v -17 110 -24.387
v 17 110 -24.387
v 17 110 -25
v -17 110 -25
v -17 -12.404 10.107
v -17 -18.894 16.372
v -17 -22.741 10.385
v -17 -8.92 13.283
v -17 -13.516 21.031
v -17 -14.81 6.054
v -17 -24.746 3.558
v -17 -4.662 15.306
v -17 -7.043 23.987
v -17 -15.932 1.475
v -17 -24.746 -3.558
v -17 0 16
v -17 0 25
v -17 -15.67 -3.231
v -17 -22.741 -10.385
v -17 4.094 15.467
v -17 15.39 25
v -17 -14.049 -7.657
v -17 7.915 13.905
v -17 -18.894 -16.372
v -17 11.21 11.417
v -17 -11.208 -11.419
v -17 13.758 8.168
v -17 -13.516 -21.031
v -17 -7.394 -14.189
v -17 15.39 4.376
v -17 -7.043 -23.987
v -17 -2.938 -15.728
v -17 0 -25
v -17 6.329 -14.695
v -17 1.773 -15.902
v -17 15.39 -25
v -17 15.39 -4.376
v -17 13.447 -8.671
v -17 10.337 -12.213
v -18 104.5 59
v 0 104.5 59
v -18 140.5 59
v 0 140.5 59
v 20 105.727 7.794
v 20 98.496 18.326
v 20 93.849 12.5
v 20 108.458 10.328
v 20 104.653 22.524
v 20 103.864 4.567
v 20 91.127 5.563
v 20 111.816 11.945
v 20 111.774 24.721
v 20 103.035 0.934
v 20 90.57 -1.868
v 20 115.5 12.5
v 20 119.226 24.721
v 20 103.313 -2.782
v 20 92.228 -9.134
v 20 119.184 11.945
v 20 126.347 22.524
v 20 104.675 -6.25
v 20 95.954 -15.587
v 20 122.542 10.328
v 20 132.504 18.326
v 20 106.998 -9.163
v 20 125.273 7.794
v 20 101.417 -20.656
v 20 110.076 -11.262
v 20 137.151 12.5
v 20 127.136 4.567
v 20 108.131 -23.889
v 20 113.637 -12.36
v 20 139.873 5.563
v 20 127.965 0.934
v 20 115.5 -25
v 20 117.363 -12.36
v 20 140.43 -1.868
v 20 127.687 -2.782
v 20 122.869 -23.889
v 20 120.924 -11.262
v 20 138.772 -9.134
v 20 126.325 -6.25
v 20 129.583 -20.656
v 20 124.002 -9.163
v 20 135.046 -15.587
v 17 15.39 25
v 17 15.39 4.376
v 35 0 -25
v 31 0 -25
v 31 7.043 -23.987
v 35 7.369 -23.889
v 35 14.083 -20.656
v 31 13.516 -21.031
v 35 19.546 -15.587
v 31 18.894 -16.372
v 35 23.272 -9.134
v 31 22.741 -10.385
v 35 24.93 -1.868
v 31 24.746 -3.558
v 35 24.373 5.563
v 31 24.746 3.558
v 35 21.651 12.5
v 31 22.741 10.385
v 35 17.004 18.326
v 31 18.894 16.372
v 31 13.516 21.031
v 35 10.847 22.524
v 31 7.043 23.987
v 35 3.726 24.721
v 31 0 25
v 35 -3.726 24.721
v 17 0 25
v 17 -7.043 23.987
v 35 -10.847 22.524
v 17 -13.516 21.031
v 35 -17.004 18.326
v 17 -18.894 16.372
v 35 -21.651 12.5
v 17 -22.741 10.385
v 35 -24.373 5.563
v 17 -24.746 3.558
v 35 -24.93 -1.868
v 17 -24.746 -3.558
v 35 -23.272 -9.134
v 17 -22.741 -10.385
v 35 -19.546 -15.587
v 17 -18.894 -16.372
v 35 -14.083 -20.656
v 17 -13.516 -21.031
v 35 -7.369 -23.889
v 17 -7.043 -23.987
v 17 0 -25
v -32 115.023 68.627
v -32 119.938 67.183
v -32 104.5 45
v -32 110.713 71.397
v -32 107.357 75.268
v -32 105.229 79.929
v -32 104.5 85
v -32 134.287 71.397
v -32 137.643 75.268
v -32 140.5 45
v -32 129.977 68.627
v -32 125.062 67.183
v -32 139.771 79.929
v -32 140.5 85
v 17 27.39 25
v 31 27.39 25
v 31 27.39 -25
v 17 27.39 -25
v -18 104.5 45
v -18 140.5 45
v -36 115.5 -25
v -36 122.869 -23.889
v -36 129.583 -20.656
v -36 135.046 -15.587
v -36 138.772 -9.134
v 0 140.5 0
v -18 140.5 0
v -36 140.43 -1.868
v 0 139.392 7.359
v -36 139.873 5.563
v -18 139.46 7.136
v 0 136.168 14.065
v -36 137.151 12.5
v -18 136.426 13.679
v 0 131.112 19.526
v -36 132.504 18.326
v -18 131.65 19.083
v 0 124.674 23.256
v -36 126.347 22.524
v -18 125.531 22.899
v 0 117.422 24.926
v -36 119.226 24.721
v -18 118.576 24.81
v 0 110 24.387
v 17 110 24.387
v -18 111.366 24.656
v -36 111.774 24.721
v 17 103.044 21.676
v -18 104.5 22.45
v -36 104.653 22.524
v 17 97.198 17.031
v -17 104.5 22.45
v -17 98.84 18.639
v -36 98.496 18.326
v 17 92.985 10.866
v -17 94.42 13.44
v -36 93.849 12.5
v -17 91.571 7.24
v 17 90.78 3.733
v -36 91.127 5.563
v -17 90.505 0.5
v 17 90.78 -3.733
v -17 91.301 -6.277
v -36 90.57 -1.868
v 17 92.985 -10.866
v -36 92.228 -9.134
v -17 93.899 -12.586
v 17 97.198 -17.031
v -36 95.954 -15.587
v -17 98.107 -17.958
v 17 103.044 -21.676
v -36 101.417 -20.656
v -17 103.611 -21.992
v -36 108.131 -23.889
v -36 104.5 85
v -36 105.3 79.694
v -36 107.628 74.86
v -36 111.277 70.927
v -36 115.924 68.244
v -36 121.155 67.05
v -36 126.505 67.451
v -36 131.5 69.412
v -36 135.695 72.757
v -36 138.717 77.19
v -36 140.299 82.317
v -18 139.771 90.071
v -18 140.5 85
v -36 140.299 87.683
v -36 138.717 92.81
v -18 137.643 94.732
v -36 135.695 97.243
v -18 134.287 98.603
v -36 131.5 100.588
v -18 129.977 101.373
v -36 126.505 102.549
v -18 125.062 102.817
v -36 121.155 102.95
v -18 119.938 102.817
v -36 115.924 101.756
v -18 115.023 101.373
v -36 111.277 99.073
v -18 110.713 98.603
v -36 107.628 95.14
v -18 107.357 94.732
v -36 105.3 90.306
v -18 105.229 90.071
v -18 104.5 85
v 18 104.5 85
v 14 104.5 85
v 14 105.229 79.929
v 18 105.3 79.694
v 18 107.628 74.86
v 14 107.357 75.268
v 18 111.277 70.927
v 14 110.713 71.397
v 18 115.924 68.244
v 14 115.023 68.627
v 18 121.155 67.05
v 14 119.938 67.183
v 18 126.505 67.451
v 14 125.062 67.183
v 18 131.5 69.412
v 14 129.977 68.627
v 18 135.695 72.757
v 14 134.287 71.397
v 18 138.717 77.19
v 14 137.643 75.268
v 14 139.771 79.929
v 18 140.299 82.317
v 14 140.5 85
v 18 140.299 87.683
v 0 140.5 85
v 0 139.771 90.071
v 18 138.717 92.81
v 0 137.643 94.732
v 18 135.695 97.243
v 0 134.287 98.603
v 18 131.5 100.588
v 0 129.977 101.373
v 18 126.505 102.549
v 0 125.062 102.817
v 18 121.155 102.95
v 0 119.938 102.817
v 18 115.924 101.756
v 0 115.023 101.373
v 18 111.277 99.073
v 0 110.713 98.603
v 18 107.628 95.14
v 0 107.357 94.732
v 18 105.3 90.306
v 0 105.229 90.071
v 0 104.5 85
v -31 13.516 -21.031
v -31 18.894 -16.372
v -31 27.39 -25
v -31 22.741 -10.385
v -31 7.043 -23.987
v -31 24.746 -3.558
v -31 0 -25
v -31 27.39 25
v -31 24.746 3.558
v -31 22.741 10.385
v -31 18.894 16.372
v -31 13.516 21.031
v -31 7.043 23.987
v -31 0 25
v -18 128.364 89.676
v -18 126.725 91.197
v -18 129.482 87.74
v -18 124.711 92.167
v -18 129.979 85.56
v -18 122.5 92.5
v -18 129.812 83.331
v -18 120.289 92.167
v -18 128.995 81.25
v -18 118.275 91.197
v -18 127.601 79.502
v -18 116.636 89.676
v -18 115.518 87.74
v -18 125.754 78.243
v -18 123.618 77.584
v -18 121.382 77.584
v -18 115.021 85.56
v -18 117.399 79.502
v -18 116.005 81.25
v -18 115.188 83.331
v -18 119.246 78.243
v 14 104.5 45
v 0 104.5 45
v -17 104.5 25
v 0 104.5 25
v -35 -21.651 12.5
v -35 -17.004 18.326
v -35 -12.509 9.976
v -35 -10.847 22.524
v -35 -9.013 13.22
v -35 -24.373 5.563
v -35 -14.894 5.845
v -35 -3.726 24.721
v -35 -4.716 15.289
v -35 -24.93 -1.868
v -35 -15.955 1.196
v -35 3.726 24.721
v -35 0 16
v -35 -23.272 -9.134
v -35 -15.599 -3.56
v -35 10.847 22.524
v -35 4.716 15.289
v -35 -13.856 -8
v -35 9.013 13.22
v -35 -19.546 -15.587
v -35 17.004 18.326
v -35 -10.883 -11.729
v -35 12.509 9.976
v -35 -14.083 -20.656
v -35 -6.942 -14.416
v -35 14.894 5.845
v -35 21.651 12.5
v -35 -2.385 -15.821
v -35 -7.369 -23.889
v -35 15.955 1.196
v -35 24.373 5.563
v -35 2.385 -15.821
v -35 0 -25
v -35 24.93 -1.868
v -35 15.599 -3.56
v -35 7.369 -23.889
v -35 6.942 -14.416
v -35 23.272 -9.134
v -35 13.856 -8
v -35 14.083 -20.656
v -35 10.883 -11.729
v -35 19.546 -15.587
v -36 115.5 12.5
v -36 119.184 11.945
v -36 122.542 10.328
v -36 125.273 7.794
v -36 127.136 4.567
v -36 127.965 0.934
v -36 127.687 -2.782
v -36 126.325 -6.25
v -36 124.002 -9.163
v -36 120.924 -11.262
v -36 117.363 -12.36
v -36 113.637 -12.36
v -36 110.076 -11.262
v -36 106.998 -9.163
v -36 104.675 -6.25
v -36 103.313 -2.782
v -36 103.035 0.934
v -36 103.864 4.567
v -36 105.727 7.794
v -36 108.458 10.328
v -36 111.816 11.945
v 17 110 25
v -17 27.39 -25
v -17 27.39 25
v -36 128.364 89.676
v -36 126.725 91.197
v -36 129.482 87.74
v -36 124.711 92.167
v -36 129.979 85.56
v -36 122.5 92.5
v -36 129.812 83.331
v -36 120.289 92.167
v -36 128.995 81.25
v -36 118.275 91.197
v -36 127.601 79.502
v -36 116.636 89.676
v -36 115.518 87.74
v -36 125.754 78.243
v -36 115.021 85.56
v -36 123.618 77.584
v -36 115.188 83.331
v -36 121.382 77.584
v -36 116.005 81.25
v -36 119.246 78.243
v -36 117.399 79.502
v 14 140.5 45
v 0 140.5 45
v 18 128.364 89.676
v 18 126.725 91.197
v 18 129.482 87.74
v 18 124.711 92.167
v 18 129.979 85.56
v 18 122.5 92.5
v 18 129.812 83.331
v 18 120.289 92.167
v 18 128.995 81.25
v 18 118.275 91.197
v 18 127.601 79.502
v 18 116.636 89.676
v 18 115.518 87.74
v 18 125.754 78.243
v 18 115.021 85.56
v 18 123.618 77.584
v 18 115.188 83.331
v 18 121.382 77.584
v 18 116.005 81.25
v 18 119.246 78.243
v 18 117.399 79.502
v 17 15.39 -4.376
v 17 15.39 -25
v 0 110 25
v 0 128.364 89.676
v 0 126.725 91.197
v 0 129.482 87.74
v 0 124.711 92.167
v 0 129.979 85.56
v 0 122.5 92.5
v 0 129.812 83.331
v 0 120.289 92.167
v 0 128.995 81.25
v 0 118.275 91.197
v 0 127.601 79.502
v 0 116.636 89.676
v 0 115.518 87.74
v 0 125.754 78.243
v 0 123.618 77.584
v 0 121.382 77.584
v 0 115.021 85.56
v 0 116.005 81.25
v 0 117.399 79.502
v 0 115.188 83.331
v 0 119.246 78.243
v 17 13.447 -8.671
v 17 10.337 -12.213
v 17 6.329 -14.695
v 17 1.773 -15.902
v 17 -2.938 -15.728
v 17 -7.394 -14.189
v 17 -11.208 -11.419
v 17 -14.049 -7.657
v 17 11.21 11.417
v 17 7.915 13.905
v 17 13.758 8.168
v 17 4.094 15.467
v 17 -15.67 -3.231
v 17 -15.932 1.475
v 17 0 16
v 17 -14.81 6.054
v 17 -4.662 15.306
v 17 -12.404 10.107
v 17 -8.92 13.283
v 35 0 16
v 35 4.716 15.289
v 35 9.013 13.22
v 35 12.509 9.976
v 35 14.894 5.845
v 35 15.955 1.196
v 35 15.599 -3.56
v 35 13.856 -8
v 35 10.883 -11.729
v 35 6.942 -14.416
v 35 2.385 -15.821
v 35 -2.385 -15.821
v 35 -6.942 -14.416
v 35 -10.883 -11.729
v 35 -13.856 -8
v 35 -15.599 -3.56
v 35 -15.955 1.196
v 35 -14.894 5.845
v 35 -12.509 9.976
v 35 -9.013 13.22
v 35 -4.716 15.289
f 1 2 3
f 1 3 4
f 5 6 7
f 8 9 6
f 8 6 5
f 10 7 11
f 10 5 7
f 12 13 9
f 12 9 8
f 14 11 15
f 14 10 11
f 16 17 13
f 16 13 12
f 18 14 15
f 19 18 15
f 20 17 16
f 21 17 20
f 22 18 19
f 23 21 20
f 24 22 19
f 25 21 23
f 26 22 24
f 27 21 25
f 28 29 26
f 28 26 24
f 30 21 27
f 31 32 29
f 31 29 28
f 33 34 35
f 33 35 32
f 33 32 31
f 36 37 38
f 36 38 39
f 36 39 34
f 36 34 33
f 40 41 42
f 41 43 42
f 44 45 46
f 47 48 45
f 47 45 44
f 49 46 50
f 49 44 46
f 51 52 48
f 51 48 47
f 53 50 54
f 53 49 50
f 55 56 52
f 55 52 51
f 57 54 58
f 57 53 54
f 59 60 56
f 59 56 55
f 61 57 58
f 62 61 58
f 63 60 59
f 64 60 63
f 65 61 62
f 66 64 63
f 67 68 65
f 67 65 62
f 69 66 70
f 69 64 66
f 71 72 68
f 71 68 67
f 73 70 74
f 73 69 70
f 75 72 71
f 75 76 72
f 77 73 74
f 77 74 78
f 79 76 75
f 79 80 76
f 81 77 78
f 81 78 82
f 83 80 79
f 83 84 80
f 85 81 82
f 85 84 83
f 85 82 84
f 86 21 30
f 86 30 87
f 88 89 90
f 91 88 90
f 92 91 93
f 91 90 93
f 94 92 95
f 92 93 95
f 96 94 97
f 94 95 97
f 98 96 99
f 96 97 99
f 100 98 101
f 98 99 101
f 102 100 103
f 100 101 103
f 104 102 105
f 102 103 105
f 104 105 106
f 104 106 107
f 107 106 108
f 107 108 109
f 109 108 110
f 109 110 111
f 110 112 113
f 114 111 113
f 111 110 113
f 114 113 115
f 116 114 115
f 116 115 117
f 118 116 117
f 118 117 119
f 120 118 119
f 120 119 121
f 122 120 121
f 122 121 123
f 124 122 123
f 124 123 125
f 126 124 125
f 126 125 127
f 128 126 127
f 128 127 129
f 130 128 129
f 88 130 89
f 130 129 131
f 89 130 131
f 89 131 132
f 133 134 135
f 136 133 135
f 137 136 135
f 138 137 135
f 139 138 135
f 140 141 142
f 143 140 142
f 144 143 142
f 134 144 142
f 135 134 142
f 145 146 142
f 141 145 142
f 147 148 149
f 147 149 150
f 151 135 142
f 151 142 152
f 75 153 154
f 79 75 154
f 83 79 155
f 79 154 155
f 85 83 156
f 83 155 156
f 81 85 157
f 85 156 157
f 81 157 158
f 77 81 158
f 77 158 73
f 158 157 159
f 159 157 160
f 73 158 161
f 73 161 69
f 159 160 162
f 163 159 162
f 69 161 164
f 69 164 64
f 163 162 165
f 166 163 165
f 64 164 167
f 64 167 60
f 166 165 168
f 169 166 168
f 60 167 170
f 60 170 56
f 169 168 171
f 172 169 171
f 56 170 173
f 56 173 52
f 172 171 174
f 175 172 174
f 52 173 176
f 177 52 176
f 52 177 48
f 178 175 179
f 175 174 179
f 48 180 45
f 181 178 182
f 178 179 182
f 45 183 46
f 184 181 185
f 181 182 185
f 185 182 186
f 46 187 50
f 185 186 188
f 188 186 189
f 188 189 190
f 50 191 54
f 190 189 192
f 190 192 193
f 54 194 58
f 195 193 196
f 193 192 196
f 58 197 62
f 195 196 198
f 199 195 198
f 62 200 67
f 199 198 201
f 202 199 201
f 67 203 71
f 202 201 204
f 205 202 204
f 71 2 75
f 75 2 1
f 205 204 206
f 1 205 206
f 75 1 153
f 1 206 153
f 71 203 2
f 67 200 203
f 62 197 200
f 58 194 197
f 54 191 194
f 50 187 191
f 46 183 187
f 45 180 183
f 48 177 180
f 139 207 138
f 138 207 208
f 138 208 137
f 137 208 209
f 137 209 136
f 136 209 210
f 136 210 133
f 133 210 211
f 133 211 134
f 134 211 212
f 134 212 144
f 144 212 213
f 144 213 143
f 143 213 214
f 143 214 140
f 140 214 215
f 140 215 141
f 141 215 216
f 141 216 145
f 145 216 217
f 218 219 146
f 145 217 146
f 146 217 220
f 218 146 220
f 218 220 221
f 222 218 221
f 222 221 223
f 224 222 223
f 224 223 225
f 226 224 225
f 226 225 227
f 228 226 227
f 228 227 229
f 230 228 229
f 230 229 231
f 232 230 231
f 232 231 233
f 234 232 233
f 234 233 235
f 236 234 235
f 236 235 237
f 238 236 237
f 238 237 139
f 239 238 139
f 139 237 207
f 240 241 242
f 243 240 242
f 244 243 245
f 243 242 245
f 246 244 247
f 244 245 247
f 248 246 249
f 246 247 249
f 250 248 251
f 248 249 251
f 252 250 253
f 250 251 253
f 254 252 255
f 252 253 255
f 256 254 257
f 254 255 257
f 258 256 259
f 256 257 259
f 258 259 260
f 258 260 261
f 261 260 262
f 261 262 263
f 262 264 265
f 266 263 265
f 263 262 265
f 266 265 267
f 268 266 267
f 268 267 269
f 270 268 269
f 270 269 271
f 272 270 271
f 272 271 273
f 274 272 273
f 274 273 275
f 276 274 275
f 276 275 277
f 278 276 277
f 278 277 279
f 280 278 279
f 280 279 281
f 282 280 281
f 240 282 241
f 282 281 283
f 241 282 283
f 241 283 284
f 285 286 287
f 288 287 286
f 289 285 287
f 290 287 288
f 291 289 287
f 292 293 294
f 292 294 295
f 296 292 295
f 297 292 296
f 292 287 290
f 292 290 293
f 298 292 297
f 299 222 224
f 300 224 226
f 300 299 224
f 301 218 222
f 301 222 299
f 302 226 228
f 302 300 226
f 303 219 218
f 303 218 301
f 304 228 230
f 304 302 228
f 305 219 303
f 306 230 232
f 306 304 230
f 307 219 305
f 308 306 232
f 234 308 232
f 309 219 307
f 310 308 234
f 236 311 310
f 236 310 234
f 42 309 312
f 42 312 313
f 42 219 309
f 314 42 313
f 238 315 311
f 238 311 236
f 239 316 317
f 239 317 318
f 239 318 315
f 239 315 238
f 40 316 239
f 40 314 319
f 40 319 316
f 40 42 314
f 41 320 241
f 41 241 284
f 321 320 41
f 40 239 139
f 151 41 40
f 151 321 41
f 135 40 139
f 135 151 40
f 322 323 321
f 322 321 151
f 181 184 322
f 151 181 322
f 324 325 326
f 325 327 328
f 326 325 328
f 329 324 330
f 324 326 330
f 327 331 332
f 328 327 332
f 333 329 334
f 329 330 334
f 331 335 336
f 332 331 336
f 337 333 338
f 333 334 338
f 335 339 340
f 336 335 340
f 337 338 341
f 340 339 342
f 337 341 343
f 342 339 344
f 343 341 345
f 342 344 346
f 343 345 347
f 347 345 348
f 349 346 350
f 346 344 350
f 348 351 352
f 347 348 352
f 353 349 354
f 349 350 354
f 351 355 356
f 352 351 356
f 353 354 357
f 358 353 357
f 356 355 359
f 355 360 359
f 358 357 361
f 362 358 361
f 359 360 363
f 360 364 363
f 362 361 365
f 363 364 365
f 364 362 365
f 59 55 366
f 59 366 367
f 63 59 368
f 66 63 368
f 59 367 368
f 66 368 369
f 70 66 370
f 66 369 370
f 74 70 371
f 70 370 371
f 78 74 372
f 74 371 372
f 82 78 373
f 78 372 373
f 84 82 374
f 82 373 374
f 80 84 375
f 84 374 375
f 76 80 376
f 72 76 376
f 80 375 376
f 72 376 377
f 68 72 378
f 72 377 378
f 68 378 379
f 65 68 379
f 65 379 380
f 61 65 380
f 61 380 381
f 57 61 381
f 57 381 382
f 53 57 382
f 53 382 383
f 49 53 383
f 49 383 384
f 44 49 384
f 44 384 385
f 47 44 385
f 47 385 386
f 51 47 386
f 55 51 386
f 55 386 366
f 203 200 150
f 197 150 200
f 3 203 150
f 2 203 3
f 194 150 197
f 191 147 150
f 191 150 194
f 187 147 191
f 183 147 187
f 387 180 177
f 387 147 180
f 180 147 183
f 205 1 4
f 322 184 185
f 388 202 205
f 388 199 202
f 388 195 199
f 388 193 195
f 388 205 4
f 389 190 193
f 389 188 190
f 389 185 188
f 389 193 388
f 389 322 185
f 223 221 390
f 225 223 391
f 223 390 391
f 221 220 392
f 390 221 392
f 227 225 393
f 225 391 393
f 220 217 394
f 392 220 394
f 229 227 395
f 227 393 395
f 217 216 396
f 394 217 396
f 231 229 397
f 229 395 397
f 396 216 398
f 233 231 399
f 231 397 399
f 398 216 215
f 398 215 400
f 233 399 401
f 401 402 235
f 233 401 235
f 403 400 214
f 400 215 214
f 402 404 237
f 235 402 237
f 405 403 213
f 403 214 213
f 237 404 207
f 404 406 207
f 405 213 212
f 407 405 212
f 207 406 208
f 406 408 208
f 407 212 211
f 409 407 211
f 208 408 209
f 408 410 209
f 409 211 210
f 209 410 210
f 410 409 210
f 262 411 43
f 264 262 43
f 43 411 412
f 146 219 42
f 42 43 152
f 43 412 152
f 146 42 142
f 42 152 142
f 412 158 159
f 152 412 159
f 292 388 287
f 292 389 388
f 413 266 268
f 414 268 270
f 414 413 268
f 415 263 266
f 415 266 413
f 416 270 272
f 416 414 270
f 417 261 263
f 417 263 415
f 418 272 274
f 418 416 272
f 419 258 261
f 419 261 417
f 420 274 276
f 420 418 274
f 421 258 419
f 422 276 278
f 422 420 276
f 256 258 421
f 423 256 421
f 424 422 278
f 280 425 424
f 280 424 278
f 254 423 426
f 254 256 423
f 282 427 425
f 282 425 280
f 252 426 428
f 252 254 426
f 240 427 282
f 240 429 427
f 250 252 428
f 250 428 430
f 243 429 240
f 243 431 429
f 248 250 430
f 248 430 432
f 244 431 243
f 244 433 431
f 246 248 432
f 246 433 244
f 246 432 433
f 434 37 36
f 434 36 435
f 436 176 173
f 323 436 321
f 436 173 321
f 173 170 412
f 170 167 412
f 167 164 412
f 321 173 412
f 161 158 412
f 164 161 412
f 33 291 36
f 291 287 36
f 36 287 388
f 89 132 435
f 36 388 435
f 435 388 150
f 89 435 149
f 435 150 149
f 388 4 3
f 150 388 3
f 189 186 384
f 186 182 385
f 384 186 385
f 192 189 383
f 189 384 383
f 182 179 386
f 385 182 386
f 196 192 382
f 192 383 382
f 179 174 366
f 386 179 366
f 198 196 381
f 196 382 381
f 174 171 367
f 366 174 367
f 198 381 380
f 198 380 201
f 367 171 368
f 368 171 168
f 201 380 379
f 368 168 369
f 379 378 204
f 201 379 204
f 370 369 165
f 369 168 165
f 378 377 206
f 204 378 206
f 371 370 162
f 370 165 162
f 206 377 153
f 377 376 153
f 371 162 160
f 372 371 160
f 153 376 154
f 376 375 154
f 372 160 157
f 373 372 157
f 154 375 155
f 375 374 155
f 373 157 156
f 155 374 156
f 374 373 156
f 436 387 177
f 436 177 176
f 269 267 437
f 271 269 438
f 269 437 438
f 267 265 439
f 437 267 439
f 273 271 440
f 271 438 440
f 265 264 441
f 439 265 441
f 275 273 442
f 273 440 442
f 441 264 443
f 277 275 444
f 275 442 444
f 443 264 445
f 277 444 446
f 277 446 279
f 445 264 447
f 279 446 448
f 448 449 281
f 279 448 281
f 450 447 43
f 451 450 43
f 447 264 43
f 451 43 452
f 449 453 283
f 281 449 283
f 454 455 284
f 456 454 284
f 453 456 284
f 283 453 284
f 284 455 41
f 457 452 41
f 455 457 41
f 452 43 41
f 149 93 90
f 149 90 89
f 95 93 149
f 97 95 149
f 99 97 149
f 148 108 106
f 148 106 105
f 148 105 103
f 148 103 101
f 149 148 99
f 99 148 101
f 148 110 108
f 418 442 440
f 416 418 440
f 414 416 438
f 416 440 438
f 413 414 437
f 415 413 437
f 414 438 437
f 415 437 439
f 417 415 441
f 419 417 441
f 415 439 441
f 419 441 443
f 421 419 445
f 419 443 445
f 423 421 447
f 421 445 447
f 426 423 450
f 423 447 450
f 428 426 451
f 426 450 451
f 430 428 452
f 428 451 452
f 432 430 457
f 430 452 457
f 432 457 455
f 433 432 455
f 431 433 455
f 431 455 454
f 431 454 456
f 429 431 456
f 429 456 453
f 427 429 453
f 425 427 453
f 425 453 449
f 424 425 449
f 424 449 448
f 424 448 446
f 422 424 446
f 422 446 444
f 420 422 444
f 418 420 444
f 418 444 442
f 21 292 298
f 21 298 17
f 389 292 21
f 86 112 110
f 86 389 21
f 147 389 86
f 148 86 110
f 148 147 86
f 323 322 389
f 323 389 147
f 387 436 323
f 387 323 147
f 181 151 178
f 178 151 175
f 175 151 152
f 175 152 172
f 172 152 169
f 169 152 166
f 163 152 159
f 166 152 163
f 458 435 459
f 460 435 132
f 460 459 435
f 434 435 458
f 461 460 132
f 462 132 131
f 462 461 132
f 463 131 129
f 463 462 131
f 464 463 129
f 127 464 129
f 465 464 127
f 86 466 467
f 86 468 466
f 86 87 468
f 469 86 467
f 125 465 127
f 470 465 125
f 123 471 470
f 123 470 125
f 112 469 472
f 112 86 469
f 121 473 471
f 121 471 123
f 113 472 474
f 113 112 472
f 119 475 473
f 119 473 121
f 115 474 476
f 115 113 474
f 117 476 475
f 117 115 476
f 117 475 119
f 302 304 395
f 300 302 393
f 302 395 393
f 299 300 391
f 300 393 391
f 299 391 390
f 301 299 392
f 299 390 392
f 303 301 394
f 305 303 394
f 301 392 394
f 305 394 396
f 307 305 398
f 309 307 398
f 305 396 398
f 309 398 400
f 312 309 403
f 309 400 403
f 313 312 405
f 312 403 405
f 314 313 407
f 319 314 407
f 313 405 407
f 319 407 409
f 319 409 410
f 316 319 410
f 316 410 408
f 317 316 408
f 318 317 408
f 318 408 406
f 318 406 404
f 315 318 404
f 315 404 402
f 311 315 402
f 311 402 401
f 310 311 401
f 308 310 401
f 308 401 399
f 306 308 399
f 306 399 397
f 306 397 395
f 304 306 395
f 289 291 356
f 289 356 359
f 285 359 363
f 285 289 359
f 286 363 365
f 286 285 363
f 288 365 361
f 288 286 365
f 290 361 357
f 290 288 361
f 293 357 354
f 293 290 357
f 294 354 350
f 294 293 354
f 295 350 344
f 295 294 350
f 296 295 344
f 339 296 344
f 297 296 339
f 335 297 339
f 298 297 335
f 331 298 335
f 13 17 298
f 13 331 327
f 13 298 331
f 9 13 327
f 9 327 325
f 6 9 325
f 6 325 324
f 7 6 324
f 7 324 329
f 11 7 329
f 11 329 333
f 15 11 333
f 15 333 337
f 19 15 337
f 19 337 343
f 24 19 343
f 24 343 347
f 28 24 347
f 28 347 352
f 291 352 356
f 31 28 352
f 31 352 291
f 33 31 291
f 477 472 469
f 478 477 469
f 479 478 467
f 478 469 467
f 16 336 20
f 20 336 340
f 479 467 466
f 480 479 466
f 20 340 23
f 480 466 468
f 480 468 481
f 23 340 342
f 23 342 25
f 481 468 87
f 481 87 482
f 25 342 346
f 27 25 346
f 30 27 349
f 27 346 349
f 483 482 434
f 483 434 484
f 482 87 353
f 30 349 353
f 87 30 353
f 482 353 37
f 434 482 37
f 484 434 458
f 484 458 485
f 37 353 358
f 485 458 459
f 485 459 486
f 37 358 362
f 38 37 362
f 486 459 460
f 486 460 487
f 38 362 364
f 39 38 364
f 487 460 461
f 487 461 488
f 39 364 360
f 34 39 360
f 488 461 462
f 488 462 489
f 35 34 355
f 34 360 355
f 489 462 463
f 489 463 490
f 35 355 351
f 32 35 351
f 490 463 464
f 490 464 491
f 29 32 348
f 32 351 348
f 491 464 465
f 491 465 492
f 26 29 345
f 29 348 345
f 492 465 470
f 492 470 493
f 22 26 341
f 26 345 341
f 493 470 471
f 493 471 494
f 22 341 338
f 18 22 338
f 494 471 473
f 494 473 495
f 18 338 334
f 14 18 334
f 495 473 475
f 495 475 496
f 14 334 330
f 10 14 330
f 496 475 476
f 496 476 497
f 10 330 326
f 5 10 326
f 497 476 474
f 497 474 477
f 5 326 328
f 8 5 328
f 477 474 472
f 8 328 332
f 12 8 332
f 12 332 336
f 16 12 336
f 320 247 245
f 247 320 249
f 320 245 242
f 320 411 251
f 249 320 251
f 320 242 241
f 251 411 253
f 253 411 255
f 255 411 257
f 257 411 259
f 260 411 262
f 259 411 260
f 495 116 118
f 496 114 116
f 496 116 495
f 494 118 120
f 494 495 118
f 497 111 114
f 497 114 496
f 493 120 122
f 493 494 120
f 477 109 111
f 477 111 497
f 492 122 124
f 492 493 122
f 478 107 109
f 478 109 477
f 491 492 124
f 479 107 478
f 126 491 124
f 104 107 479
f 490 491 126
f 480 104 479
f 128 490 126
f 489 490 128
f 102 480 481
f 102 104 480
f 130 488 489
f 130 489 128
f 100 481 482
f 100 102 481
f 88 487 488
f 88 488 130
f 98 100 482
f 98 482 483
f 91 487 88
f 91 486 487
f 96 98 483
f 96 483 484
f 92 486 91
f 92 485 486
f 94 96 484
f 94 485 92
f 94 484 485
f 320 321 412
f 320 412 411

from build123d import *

# Parameters (mm, degrees)
BOSS_EXTRUDE1_DEPTH      = 25
SKETCH2_R                = 25
BOSS_EXTRUDE2_DEPTH      = 18
BOSS_EXTRUDE3_DEPTH      = 18
BOSS_EXTRUDE4_DEPTH      = 20
BOSS_EXTRUDE4_DEPTH_BACK = 36
SKETCH4_R                = 25
SKETCH5_R                = 18
BOSS_EXTRUDE5_DEPTH      = 18
BOSS_EXTRUDE6_START      = -18
SKETCH6_R                = 18
BOSS_EXTRUDE6_DEPTH      = 18
HOLE1_D                  = 32
HOLE2_D                  = 25
HOLE3_D                  = 15


with BuildPart() as part:
    # Sketch1 → Boss-Extrude1 (new, symmetric)
    with BuildSketch(Plane.XY):
        Polygon((-31, 0), (-17, 0), (-17, 15.39), (17, 15.39), (17, 0), (31, 0), (31, 27.39), (17, 27.39), (17, 110), (-17, 110), (-17, 27.39), (-31, 27.39), align=None)
    extrude(amount=BOSS_EXTRUDE1_DEPTH, both=True)

    # Sketch2 → Boss-Extrude2 (add)
    with BuildSketch(Plane(origin=(-17, 0, 0), x_dir=(0, 0, -1), z_dir=(1, 0, 0))):
        Circle(SKETCH2_R)
    boss_extrude2 = extrude(amount=-BOSS_EXTRUDE2_DEPTH)

    # Mirror1: Boss-Extrude2 across plane
    add(boss_extrude2.mirror(Plane(origin=(0, 0, 0), x_dir=(0, 0, 1), z_dir=(1, 0, 0))))

    # Sketch3 → Boss-Extrude3 (add, symmetric)
    with BuildSketch(Plane(origin=(0, 122.5, 0), x_dir=(1, 0, 0), z_dir=(0, 1, 0))):
        Polygon((-18, 0), (0, 0), (0, -45), (14, -45), (14, -85), (0, -85), (0, -59), (-18, -59), (-18, -85), (-32, -85), (-32, -45), (-18, -45), align=None)
    extrude(amount=BOSS_EXTRUDE3_DEPTH, both=True)

    # Sketch4 → Boss-Extrude4 (add, two sides: drawn at the far end of the back side and taken through both)
    with BuildSketch(Plane(origin=(0, 0, 0), x_dir=(0, 0, -1), z_dir=(1, 0, 0)).offset(-BOSS_EXTRUDE4_DEPTH_BACK)):
        with Locations((0, 115.5)):
            Circle(SKETCH4_R)
    extrude(amount=BOSS_EXTRUDE4_DEPTH + BOSS_EXTRUDE4_DEPTH_BACK)

    # Sketch5 → Boss-Extrude5 (add)
    with BuildSketch(Plane(origin=(0, 0, 0), x_dir=(0, 0, -1), z_dir=(1, 0, 0))):
        with Locations(Location((-85, 122.5, 0), (0, 0, 270))):
            Circle(SKETCH5_R)
    extrude(amount=BOSS_EXTRUDE5_DEPTH)

    # Sketch6 → Boss-Extrude6 (add)
    with BuildSketch(Plane(origin=(-18, 0, 0), x_dir=(0, 0, -1), z_dir=(1, 0, 0)).offset(BOSS_EXTRUDE6_START)):
        with Locations(Location((-85, 122.5, 0), (0, 0, 270))):
            Circle(SKETCH6_R)
    extrude(amount=BOSS_EXTRUDE6_DEPTH)

    # Hole1 (through all)
    with Locations(Plane(origin=(35, 0, 0), x_dir=(0, 0, -1), z_dir=(1, 0, 0))):
        with Locations((0, 0)):
            Hole(HOLE1_D / 2)

    # Hole2 (through all)
    with Locations(Plane(origin=(20, 0, 0), x_dir=(0, 0, -1), z_dir=(1, 0, 0))):
        with Locations((0, 115.5)):
            Hole(HOLE2_D / 2)

    # Hole3 (through all)
    with Locations(Plane(origin=(18, 0, 0), x_dir=(0, 0, -1), z_dir=(1, 0, 0))):
        with Locations((-85, 122.5)):
            Hole(HOLE3_D / 2)


solid = part.part
